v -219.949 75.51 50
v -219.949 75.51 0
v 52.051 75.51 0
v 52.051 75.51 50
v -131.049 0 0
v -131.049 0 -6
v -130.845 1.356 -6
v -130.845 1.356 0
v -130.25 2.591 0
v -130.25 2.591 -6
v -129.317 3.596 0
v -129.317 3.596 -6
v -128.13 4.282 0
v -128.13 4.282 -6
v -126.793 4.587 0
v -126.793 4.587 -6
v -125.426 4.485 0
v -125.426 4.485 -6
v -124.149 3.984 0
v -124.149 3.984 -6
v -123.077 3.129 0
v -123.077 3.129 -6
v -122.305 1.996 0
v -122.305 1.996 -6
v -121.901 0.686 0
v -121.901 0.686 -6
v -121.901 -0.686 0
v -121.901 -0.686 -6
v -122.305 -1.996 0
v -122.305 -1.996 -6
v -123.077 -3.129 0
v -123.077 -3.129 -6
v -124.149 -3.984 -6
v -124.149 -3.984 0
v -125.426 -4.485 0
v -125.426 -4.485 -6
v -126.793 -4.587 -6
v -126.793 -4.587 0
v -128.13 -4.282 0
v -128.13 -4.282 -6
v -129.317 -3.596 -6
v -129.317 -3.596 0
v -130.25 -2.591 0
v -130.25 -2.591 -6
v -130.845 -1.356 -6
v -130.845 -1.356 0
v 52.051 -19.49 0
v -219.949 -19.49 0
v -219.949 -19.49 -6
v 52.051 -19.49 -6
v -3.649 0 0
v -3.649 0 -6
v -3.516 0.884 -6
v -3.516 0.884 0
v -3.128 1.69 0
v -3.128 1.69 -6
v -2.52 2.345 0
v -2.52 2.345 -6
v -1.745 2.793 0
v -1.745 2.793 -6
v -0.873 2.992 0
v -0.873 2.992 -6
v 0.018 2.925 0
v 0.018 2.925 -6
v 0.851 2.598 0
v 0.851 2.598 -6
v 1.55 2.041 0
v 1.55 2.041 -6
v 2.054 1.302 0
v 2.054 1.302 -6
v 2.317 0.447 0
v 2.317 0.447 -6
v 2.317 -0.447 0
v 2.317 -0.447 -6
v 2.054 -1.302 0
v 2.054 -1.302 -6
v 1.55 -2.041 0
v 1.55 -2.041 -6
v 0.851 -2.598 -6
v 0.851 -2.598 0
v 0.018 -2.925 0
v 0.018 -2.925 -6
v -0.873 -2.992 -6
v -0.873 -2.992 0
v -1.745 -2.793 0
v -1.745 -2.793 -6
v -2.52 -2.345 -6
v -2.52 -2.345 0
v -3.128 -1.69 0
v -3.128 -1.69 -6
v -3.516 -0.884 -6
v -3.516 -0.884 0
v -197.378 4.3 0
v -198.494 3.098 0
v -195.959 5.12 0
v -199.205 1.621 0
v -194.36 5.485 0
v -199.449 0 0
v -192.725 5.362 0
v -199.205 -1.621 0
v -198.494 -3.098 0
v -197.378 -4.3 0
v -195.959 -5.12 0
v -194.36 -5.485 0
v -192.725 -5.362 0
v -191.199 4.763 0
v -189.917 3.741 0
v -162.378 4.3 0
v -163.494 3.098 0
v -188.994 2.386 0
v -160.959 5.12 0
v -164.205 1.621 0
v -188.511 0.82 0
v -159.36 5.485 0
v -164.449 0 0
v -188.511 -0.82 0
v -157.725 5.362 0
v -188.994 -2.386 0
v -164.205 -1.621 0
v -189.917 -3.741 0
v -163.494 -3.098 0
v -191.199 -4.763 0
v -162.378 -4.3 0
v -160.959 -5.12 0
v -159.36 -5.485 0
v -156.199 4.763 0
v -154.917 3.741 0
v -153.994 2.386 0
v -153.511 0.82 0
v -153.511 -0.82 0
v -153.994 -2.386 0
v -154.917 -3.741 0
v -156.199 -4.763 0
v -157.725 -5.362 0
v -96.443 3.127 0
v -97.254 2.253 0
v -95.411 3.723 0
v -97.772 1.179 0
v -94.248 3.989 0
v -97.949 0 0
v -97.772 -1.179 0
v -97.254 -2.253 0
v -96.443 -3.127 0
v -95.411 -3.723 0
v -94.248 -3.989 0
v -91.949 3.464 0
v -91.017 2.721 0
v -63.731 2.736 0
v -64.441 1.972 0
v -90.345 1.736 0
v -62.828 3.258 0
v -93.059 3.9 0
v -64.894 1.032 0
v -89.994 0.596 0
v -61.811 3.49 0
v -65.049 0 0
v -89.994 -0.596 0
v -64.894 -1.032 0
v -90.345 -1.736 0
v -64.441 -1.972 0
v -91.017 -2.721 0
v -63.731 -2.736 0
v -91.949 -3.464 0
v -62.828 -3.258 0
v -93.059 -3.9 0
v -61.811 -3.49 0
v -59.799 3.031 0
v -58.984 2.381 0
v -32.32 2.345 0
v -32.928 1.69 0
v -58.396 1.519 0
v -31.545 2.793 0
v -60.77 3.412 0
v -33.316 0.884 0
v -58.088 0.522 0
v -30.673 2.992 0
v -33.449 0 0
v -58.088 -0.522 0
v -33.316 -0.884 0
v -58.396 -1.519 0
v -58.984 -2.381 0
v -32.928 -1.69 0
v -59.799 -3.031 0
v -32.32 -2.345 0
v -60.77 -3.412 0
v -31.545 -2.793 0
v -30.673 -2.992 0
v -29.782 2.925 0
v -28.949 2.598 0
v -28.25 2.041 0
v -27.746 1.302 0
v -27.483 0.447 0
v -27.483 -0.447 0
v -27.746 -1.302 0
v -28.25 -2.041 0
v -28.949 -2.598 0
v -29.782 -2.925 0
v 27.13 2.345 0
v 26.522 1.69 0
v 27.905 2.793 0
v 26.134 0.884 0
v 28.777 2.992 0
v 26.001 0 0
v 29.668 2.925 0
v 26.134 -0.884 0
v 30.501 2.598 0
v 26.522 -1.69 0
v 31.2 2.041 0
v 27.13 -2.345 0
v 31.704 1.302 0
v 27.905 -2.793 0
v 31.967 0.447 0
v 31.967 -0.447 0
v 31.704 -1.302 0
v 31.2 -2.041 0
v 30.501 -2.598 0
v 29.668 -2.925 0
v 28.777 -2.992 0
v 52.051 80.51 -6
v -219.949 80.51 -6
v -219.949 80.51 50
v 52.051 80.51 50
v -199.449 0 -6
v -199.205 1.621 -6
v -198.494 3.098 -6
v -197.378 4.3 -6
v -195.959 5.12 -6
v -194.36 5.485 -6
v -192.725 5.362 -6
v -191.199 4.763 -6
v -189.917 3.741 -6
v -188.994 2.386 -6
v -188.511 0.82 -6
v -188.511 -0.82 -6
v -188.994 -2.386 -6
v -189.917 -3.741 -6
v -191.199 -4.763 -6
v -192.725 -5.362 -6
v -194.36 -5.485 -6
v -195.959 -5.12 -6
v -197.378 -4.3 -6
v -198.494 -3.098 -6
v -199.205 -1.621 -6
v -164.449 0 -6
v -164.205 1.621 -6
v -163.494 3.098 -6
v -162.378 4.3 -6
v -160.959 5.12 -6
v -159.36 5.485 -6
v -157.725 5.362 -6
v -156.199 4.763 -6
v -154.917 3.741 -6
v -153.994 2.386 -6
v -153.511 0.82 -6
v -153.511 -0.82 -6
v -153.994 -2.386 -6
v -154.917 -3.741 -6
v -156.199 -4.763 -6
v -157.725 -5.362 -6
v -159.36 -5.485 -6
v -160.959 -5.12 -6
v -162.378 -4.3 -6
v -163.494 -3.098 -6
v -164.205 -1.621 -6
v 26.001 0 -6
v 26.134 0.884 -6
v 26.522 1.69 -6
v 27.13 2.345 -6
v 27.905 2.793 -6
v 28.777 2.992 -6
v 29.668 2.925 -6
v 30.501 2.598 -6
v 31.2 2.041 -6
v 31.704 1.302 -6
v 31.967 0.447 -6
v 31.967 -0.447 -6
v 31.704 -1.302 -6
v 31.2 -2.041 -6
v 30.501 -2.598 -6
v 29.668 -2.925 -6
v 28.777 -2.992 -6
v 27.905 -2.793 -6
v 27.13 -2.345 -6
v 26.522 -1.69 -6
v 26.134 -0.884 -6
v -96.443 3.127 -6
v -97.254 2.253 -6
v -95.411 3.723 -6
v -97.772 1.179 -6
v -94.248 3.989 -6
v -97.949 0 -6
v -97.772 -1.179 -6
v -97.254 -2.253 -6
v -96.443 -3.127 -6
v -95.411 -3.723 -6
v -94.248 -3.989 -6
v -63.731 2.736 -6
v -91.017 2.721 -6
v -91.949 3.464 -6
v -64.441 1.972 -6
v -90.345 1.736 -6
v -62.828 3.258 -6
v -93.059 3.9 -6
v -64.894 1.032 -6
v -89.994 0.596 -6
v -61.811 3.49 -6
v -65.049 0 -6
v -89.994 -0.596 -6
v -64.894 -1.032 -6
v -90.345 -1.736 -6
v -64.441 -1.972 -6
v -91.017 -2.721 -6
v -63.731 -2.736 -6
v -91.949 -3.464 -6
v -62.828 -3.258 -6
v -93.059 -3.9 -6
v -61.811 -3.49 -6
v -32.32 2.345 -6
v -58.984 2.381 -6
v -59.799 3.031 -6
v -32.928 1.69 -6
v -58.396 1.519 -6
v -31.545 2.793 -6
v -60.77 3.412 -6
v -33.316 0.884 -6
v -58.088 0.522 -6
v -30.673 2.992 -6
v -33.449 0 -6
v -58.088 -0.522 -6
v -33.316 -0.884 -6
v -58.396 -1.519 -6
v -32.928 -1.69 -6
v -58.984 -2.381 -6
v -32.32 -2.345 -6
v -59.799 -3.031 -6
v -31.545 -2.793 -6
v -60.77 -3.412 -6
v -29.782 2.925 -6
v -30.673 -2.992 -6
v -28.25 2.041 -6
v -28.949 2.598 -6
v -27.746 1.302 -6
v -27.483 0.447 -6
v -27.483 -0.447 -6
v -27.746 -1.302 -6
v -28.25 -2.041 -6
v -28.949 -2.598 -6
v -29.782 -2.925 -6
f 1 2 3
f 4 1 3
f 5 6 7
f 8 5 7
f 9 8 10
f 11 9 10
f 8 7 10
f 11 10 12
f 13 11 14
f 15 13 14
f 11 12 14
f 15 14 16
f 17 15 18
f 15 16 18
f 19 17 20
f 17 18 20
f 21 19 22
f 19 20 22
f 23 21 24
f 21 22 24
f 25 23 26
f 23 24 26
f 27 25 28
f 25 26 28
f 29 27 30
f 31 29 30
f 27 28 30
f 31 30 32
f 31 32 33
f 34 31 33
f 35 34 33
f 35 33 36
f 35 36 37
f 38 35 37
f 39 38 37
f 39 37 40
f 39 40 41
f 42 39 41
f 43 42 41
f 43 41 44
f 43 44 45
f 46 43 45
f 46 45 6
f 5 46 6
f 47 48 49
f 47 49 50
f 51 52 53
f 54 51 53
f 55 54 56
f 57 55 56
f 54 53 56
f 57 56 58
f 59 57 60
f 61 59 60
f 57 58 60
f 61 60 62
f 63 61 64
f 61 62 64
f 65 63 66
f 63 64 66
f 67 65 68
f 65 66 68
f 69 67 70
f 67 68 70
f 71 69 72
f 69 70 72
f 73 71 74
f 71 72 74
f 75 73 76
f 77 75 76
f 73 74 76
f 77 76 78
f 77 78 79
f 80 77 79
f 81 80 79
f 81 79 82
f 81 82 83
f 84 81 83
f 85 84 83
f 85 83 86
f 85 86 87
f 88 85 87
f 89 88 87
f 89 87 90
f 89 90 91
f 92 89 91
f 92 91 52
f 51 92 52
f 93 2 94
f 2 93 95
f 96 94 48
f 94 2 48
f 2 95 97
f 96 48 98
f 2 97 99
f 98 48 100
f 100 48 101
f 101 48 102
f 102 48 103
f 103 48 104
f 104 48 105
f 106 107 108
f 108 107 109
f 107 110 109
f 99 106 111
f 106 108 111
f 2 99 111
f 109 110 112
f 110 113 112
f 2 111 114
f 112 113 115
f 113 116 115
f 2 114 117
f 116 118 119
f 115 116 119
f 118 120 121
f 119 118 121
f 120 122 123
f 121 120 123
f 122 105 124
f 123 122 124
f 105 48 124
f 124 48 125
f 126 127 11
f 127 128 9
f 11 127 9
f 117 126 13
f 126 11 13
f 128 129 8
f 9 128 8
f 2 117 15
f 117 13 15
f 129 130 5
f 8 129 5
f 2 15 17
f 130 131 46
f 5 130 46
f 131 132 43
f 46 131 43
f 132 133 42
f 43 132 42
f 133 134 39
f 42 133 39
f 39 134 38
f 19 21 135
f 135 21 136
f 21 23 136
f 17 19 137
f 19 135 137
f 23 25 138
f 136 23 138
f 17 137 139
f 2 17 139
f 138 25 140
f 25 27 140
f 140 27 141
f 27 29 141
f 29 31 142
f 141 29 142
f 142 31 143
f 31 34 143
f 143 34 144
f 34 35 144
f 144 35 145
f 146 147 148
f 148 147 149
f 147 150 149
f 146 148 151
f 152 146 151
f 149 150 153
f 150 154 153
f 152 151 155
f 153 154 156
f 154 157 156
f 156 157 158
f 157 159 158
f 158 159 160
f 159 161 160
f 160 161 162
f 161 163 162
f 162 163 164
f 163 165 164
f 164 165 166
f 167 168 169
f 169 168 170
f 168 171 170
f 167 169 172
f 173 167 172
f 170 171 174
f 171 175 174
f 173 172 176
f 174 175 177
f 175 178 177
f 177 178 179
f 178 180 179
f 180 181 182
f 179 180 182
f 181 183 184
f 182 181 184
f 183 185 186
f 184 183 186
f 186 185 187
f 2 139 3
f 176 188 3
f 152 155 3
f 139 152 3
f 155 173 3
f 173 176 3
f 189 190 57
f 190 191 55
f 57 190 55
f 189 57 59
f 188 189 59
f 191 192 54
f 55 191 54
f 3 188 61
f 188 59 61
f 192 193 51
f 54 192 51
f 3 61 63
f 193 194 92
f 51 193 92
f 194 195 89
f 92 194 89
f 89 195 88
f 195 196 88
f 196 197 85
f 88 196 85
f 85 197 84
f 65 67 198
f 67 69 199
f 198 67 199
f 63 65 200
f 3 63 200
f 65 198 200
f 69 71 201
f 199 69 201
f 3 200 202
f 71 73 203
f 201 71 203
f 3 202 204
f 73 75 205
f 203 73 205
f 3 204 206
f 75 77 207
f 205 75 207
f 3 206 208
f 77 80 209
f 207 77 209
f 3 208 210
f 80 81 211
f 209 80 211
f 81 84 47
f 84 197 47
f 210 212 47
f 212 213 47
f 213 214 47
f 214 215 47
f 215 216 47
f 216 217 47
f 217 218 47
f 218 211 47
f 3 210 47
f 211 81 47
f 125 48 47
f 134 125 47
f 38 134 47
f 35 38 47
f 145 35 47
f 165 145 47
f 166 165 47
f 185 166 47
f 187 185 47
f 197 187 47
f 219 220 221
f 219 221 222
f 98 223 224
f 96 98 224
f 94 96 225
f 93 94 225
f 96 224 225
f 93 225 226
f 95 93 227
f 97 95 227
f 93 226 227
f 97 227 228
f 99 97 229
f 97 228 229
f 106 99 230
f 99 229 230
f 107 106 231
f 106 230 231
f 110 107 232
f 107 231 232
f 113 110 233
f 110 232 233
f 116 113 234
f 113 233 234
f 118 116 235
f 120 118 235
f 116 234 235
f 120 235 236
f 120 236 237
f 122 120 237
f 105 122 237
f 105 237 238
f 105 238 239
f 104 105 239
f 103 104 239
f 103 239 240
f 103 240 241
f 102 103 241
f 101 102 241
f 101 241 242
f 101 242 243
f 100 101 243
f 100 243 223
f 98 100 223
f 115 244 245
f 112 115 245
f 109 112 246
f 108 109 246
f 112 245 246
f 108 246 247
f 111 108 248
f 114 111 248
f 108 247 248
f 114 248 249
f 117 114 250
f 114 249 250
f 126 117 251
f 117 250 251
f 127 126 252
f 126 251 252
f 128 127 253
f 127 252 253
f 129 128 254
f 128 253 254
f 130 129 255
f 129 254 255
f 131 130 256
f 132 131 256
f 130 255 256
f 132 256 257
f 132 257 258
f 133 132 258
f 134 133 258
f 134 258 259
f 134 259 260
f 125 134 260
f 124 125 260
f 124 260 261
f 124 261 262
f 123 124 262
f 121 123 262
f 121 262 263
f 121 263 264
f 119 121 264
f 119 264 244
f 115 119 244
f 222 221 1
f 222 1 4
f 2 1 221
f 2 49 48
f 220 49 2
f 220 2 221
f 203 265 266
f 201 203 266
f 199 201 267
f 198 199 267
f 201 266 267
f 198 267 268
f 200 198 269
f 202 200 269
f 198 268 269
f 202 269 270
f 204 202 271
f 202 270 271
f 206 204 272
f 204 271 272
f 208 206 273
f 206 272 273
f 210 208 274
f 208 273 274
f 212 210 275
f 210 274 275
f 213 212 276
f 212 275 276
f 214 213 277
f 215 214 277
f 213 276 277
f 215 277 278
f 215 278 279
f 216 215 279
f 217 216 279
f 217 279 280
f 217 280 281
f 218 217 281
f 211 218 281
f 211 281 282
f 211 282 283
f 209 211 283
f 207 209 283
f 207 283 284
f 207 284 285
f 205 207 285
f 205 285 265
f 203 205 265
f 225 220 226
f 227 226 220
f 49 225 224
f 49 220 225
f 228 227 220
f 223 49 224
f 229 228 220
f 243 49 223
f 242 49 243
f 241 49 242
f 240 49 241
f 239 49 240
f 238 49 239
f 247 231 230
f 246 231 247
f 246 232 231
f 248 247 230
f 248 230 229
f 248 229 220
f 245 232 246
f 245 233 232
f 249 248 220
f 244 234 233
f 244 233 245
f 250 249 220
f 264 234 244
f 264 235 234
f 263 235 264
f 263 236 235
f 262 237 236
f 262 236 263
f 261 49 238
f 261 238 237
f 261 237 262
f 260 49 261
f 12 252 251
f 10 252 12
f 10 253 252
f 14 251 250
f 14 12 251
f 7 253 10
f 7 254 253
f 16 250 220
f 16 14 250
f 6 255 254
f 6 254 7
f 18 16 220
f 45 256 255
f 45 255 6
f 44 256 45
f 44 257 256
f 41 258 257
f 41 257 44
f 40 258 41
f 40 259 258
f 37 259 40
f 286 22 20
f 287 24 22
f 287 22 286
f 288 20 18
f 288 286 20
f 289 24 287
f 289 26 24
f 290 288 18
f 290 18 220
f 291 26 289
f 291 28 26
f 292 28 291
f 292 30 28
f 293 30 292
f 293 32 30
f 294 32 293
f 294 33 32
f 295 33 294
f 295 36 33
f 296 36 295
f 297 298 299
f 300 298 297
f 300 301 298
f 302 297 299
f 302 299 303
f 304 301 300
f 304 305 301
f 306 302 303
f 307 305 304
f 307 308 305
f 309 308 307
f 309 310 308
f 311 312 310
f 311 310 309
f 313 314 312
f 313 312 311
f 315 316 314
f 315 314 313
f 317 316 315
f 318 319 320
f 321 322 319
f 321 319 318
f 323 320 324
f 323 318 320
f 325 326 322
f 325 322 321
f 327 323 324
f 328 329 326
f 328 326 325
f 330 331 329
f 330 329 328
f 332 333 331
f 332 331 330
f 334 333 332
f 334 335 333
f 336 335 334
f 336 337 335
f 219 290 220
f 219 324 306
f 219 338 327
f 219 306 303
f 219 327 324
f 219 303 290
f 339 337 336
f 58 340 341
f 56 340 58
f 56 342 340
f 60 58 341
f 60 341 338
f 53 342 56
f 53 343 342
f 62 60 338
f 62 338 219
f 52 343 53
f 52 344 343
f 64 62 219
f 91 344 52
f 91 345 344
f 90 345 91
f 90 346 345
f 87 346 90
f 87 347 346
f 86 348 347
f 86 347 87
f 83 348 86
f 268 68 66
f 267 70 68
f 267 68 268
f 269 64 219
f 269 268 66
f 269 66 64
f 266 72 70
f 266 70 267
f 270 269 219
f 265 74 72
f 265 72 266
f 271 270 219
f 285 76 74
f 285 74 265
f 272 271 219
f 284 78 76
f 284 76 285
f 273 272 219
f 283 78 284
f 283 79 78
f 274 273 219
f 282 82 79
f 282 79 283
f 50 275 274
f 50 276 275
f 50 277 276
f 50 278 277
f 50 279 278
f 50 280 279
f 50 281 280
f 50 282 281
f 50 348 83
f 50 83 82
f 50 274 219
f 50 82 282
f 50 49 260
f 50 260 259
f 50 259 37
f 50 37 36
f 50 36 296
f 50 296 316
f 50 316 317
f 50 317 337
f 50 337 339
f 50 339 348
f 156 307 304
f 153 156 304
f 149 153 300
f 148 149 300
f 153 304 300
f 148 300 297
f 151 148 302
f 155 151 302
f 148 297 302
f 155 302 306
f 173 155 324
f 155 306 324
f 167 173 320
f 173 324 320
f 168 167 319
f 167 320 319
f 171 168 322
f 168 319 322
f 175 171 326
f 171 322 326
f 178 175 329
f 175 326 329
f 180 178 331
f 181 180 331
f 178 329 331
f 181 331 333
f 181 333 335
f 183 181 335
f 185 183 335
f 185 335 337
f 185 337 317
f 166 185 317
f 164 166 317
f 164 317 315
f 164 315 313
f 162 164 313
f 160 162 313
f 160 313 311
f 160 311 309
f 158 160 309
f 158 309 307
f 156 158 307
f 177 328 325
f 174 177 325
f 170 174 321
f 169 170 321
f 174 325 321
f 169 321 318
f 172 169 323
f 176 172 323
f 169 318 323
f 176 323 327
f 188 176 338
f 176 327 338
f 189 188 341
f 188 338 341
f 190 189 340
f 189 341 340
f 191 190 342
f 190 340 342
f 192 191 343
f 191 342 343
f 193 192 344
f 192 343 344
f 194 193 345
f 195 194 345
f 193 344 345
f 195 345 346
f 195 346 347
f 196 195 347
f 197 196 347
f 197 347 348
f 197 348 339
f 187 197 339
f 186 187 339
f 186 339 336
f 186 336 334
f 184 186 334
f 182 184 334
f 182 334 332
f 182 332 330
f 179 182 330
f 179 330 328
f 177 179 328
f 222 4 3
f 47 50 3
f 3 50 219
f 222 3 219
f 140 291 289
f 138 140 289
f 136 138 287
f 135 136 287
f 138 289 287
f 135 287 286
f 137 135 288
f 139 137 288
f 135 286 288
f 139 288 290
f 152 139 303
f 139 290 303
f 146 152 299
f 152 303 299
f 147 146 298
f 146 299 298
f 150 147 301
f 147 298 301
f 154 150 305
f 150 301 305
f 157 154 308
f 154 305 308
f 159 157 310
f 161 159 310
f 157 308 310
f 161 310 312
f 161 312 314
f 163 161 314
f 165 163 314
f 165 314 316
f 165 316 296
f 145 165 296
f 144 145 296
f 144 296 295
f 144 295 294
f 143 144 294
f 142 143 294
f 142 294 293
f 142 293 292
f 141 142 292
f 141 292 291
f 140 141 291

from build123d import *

# Parameters (mm, degrees)
F0_W      = 272
F0_H      = 19.490359351
F0_H_2    = 30.509640649
F1_DEPTH  = 6
F2_D      = 11
F3_D      = 11
F4_D      = 9.2
F5_D      = 8
F6_D      = 7
F7_D      = 6
F8_D      = 6
F9_D      = 6
F10_DEPTH = 50
F11_W     = 272
F11_H     = 5
F12_DEPTH = 50


with BuildPart() as f1:
    # F0 (on Top) → F1 (new body)
    with BuildSketch(Plane.XY):
        with Locations((-83.9492530227, -9.7451796755)):
            Rectangle(F0_W, F0_H)
        with Locations((-83.9492530227, 15.2548203245)):
            Rectangle(F0_W, F0_H_2)
    extrude(amount=-F1_DEPTH)

    # F2 (through all)
    with Locations(Plane.XY):
        with Locations((-193.9492530227, 0)):
            Hole(F2_D / 2)

    # F3 (through all)
    with Locations(Plane.XY):
        with Locations((-158.9492530227, 0)):
            Hole(F3_D / 2)

    # F4 (through all)
    with Locations(Plane.XY):
        with Locations((-126.4492530227, 0)):
            Hole(F4_D / 2)

    # F5 (through all)
    with Locations(Plane.XY):
        with Locations((-93.9492530227, 0)):
            Hole(F5_D / 2)

    # F6 (through all)
    with Locations(Plane.XY):
        with Locations((-61.5492530227, 0)):
            Hole(F6_D / 2)

    # F7 (through all)
    with Locations(Plane.XY):
        with Locations((-30.4492530227, 0)):
            Hole(F7_D / 2)

    # F8 (through all)
    with Locations(Plane.XY):
        with Locations((29.0007469773, 0)):
            Hole(F8_D / 2)

    # F9 (through all)
    with Locations(Plane.XY):
        with Locations((-0.6492530227, 0)):
            Hole(F9_D / 2)

    # F10 (add): a face of the model
    f10_faces = [f1.faces().sort_by_distance(p)[0] for p in [
        (-83.9492530227, 30.509640649, -3),
    ]]
    extrude(f10_faces, amount=F10_DEPTH)

    # F11 (on face) → F12 (join)
    with BuildSketch(Plane.XY):
        with Locations((-83.9492530227, 78.009640649)):
            Rectangle(F11_W, F11_H)
    extrude(amount=F12_DEPTH)


solid = f1.part
